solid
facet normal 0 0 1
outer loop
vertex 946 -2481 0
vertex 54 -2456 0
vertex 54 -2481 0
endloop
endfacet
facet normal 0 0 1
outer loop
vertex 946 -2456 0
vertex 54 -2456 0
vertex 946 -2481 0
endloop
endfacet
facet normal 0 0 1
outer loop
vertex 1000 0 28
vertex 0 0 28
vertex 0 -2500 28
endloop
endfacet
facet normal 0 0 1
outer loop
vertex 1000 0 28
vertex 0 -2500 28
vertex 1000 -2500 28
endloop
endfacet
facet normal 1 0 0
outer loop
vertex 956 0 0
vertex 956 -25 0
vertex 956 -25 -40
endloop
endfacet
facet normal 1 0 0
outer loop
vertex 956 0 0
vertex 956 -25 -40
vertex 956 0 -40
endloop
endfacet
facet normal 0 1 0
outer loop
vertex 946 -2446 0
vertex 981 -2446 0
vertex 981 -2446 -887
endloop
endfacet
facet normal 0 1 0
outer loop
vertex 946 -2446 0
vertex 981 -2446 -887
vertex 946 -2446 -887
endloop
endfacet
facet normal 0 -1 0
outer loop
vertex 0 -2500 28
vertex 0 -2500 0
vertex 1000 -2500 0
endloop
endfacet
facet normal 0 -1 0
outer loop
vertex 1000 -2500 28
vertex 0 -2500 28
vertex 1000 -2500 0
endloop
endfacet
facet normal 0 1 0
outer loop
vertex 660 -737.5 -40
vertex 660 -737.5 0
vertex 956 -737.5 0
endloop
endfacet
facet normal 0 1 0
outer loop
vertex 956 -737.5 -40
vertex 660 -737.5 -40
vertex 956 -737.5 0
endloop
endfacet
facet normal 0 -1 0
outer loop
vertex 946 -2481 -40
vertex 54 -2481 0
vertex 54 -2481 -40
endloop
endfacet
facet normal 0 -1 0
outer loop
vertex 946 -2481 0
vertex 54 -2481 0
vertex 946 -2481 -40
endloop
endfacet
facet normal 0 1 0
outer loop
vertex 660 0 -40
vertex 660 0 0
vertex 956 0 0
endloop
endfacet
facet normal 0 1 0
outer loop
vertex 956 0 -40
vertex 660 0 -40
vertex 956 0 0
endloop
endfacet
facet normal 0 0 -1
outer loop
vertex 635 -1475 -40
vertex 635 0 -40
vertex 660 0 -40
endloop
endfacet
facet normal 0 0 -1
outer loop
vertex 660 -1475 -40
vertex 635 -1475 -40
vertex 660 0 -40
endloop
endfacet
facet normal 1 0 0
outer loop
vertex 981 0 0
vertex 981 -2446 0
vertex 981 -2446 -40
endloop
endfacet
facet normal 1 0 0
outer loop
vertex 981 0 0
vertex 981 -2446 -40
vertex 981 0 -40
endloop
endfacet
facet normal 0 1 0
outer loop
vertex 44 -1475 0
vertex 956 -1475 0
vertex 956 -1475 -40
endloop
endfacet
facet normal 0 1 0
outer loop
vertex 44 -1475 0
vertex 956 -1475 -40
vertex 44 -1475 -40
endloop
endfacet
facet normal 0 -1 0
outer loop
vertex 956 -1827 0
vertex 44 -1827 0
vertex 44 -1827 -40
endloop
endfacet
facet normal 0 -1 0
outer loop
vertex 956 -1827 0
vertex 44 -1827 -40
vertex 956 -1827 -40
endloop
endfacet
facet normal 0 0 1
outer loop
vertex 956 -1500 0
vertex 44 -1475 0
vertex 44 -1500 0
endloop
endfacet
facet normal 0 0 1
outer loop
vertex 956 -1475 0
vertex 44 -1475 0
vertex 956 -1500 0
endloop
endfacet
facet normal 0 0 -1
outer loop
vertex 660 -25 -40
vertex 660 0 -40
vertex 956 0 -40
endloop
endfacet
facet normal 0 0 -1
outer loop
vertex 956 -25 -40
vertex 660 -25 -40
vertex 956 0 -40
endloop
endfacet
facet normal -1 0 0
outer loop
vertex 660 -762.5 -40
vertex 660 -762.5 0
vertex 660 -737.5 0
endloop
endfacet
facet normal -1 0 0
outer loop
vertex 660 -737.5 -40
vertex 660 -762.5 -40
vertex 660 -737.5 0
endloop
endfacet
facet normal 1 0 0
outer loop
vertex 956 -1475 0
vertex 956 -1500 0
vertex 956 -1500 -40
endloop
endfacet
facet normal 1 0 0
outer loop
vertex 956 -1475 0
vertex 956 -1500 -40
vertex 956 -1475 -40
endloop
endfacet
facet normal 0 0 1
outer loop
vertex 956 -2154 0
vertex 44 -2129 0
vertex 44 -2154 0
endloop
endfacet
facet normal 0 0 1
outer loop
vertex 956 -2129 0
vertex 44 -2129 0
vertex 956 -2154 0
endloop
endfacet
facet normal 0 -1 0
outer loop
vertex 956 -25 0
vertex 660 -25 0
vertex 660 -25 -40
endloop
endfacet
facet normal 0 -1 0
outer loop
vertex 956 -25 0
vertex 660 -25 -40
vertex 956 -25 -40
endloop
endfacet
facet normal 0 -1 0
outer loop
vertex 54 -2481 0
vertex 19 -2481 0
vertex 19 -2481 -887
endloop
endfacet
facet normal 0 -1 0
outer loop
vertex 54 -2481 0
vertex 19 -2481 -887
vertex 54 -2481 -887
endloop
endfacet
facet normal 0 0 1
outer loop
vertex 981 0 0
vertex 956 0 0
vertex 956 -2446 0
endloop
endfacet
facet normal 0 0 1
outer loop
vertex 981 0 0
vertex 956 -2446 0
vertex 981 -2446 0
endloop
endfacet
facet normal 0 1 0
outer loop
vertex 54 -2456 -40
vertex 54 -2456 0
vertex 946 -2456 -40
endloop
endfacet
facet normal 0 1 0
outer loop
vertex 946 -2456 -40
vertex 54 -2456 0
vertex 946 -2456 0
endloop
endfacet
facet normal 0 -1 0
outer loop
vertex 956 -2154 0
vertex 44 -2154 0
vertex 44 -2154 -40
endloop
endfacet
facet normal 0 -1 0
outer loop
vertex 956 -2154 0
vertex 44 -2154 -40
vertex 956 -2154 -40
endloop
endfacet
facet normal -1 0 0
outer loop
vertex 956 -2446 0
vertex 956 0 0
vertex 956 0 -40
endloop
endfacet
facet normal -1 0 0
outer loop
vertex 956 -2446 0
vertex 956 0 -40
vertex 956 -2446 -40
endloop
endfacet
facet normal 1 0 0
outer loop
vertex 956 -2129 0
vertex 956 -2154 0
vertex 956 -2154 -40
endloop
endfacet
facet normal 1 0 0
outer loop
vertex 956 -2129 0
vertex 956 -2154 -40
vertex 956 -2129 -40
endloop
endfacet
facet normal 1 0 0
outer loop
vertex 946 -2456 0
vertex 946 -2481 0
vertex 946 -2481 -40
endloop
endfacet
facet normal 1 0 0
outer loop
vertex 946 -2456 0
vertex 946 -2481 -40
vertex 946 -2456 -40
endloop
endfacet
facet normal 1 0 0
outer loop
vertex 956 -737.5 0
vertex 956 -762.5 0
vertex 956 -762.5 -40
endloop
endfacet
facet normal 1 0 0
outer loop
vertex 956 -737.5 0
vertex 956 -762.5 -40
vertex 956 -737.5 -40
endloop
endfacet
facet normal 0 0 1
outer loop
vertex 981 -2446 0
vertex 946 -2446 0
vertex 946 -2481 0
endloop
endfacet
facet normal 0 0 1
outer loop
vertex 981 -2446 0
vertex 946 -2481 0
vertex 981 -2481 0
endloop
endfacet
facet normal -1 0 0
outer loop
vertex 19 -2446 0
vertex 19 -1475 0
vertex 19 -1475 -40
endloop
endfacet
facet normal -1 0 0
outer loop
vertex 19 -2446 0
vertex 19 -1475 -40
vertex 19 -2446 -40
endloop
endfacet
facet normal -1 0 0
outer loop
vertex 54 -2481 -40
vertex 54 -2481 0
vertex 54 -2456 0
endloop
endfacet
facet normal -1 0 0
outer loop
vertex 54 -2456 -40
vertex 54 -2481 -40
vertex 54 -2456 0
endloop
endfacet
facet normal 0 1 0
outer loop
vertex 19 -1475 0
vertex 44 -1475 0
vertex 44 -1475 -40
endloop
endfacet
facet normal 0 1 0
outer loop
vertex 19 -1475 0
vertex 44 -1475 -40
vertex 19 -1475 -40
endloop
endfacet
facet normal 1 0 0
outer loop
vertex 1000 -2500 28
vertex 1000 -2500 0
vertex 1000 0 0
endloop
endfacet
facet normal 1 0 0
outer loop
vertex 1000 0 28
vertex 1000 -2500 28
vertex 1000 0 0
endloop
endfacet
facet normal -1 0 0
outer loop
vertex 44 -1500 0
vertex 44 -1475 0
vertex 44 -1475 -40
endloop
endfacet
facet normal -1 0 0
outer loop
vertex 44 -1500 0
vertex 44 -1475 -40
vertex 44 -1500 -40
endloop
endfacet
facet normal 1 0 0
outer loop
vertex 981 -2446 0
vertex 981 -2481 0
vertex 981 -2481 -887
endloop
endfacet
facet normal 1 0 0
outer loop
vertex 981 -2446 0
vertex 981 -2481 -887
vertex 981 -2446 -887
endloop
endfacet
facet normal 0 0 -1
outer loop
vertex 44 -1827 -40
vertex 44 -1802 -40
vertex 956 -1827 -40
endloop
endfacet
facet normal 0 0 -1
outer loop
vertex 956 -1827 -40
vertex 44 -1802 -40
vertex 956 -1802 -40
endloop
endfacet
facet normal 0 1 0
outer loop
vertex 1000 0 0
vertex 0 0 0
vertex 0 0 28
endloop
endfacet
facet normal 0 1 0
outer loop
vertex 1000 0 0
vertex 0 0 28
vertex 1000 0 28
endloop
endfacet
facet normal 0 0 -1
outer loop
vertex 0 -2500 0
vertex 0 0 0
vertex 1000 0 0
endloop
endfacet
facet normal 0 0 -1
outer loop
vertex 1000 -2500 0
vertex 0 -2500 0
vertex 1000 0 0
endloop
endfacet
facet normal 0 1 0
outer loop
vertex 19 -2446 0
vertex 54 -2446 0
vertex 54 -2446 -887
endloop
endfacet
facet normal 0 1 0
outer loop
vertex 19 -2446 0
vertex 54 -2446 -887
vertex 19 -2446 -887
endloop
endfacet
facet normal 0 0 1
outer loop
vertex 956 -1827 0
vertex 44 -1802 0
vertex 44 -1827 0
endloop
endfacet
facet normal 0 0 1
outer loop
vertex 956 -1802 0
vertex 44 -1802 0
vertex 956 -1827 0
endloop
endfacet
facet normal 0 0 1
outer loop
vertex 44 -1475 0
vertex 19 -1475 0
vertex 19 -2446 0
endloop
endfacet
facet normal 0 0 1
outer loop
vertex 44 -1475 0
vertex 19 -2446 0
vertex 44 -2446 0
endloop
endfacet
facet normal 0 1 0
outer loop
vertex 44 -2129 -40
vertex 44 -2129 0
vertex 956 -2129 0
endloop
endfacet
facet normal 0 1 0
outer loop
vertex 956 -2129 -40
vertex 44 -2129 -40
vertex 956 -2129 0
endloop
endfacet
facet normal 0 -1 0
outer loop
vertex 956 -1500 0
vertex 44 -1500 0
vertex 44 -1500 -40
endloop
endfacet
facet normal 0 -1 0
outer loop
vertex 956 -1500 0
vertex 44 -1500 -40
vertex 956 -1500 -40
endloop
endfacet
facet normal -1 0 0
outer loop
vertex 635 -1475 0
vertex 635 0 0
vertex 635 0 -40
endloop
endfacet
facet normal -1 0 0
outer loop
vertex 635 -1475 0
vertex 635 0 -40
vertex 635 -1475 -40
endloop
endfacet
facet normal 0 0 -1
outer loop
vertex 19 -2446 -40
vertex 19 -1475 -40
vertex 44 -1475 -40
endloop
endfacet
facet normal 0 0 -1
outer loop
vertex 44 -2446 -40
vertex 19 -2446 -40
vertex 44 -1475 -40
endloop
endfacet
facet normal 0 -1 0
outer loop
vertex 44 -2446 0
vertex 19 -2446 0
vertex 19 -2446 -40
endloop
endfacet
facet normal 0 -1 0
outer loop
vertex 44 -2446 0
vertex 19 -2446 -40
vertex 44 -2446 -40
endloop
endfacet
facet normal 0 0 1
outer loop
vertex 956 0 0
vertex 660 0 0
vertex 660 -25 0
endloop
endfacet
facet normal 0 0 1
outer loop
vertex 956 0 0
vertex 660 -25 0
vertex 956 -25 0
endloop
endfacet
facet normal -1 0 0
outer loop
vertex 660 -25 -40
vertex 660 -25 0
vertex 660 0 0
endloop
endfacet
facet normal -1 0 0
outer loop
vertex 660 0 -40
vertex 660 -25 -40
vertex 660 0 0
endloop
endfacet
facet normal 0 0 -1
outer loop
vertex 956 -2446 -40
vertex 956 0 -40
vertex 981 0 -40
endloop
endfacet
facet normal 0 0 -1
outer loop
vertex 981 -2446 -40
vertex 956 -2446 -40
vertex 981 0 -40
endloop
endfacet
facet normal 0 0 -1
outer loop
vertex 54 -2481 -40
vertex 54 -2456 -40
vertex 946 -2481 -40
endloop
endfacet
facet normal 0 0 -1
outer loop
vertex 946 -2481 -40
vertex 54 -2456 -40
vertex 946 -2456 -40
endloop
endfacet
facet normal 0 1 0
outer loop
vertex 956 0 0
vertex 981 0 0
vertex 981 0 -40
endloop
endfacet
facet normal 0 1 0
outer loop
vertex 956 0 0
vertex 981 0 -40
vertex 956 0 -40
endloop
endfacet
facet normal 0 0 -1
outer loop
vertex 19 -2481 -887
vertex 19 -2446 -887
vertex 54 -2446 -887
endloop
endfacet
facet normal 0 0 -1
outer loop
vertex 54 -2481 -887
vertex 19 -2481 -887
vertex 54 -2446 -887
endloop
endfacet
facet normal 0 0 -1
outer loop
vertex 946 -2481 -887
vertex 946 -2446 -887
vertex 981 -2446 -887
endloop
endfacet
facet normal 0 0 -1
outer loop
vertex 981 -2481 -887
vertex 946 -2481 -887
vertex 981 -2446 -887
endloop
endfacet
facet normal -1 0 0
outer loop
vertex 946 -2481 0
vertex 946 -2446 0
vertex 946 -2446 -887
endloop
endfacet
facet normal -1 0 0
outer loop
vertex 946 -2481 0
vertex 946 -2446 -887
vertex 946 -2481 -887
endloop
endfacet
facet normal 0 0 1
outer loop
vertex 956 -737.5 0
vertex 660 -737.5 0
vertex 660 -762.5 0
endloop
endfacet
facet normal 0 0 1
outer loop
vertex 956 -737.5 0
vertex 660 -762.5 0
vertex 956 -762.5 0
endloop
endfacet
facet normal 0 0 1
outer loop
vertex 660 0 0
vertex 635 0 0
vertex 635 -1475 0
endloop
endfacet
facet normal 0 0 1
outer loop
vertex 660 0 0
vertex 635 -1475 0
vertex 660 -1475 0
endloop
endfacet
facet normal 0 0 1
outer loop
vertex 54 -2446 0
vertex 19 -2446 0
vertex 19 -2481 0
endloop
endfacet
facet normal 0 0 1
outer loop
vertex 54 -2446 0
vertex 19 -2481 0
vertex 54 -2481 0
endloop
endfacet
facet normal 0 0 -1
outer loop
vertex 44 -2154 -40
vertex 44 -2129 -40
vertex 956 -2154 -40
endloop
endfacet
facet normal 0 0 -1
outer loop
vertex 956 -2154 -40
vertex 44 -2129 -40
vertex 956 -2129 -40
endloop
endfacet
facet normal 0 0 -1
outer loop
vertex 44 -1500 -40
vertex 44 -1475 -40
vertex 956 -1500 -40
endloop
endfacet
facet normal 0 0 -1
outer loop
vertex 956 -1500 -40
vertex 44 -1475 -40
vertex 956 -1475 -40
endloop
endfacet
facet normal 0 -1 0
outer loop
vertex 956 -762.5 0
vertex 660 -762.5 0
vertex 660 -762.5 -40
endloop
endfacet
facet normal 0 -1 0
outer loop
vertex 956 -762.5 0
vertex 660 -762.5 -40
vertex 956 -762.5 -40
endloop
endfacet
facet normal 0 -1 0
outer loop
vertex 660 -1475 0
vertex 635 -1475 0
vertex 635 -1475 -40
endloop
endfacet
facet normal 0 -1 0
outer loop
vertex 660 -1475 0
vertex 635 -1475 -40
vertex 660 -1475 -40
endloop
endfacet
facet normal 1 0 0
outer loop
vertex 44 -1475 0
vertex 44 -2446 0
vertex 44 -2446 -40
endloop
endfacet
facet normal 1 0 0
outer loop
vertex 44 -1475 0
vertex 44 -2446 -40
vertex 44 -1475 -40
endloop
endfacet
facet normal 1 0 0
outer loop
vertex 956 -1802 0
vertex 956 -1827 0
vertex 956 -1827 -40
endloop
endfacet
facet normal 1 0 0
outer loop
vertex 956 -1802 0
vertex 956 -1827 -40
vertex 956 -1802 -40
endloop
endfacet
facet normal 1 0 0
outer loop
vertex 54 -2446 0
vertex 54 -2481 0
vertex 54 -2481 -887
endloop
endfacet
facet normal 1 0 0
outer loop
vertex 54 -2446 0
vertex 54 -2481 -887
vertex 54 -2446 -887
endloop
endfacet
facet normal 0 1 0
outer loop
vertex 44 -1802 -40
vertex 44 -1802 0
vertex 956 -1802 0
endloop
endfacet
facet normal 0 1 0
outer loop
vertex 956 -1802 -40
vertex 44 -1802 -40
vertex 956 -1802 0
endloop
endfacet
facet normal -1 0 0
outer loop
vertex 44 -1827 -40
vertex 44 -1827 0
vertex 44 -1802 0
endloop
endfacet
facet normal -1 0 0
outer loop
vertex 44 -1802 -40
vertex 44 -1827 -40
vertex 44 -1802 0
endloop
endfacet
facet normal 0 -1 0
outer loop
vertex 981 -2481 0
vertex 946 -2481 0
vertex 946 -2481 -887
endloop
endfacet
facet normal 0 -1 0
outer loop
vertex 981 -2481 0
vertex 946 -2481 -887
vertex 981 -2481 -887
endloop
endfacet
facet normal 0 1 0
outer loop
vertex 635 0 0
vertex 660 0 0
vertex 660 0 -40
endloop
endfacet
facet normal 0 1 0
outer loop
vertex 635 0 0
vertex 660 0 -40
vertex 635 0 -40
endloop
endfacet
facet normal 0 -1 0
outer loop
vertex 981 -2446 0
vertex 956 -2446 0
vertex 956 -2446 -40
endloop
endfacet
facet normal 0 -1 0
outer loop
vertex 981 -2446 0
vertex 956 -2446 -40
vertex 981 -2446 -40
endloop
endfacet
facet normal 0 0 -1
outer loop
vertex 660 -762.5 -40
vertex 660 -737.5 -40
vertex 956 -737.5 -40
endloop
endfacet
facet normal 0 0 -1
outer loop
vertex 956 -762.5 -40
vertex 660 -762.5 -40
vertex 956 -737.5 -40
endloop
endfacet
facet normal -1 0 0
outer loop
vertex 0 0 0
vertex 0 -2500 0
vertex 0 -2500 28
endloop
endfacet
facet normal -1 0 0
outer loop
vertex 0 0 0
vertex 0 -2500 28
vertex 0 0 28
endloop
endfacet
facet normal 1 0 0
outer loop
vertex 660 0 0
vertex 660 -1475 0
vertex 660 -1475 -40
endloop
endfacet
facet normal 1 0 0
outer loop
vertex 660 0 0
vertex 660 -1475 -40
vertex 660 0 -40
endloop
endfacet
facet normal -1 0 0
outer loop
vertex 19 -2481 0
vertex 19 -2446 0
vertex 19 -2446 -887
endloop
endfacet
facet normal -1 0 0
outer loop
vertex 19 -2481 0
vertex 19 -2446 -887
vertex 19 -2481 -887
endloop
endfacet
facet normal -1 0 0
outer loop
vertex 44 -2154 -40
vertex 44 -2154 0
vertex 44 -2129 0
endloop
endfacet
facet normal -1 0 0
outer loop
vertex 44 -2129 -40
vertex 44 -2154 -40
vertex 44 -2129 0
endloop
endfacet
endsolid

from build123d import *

# Parameters (mm, degrees)
F0_W      = 1000
F0_H      = 2500
F1_DEPTH  = 28
F3_DEPTH  = 40
F4_DEPTH  = 40
F5_DEPTH  = 40
F2_W      = 296
F2_H      = 25
F6_DEPTH  = 40
F7_DEPTH  = 40
F2_W_2    = 912
F8_DEPTH  = 40
F9_DEPTH  = 40
F10_DEPTH = 40
F11_DEPTH = 887
F12_DEPTH = 887
F2_W_3    = 892
F13_DEPTH = 40


with BuildPart() as f1:
    # F0 (on Top) → F1 (new body)
    with BuildSketch(Plane.XY):
        with Locations((500, -1250)):
            Rectangle(F0_W, F0_H)
    extrude(amount=F1_DEPTH)


with BuildPart() as f3:
    # F2 (on Top) → F3 (new body)
    with BuildSketch(Plane.XY):
        Polygon((660, 0), (635, 0), (635, -1475), (660, -1475), (660, -762.5), (660, -737.5), (660, -25), align=None)
    extrude(amount=-F3_DEPTH)


with BuildPart() as f4:
    # F2 (on Top) → F4 (new body)
    with BuildSketch(Plane.XY):
        Polygon((981, 0), (956, 0), (956, -25), (956, -737.5), (956, -762.5), (956, -1475), (956, -1500), (956, -1802), (956, -1827), (956, -2129), (956, -2154), (956, -2446), (981, -2446), align=None)
    extrude(amount=-F4_DEPTH)


with BuildPart() as f5:
    # F2 (on Top) → F5 (new body)
    with BuildSketch(Plane.XY):
        Polygon((660, -1475), (635, -1475), (44, -1475), (44, -1500), (956, -1500), (956, -1475), align=None)
    extrude(amount=-F5_DEPTH)


with BuildPart() as f6:
    # F2 (on Top) → F6 (new body)
    with BuildSketch(Plane.XY):
        with Locations((808, -12.5)):
            Rectangle(F2_W, F2_H)
    extrude(amount=-F6_DEPTH)


with BuildPart() as f7:
    # F2 (on Top) → F7 (new body)
    with BuildSketch(Plane.XY):
        with Locations((808, -750)):
            Rectangle(F2_W, F2_H)
    extrude(amount=-F7_DEPTH)


with BuildPart() as f8:
    # F2 (on Top) → F8 (new body)
    with BuildSketch(Plane.XY):
        with Locations((500, -1814.5)):
            Rectangle(F2_W_2, F2_H)
    extrude(amount=-F8_DEPTH)


with BuildPart() as f9:
    # F2 (on Top) → F9 (new body)
    with BuildSketch(Plane.XY):
        with Locations((500, -2141.5)):
            Rectangle(F2_W_2, F2_H)
    extrude(amount=-F9_DEPTH)


with BuildPart() as f10:
    # F2 (on Top) → F10 (new body)
    with BuildSketch(Plane.XY):
        Polygon((44, -1500), (44, -1475), (19, -1475), (19, -2446), (44, -2446), (44, -2154), (44, -2129), (44, -1827), (44, -1802), align=None)
    extrude(amount=-F10_DEPTH)


with BuildPart() as f11:
    # F2 (on Top) → F11 (new body)
    with BuildSketch(Plane.XY):
        Polygon((981, -2481), (981, -2446), (956, -2446), (946, -2446), (946, -2456), (946, -2481), align=None)
    extrude(amount=-F11_DEPTH)


with BuildPart() as f12:
    # F2 (on Top) → F12 (new body, through all)
    with BuildSketch(Plane.XY):
        Polygon((44, -2446), (19, -2446), (19, -2481), (54, -2481), (54, -2456), (54, -2446), align=None)
    extrude(amount=-F12_DEPTH)


with BuildPart() as f13:
    # F2 (on Top) → F13 (new body)
    with BuildSketch(Plane.XY):
        with Locations((500, -2468.5)):
            Rectangle(F2_W_3, F2_H)
    extrude(amount=-F13_DEPTH)


solid = Compound([f1.part, f3.part, f4.part, f5.part, f6.part, f7.part, f8.part, f9.part, f10.part, f11.part, f12.part, f13.part])
